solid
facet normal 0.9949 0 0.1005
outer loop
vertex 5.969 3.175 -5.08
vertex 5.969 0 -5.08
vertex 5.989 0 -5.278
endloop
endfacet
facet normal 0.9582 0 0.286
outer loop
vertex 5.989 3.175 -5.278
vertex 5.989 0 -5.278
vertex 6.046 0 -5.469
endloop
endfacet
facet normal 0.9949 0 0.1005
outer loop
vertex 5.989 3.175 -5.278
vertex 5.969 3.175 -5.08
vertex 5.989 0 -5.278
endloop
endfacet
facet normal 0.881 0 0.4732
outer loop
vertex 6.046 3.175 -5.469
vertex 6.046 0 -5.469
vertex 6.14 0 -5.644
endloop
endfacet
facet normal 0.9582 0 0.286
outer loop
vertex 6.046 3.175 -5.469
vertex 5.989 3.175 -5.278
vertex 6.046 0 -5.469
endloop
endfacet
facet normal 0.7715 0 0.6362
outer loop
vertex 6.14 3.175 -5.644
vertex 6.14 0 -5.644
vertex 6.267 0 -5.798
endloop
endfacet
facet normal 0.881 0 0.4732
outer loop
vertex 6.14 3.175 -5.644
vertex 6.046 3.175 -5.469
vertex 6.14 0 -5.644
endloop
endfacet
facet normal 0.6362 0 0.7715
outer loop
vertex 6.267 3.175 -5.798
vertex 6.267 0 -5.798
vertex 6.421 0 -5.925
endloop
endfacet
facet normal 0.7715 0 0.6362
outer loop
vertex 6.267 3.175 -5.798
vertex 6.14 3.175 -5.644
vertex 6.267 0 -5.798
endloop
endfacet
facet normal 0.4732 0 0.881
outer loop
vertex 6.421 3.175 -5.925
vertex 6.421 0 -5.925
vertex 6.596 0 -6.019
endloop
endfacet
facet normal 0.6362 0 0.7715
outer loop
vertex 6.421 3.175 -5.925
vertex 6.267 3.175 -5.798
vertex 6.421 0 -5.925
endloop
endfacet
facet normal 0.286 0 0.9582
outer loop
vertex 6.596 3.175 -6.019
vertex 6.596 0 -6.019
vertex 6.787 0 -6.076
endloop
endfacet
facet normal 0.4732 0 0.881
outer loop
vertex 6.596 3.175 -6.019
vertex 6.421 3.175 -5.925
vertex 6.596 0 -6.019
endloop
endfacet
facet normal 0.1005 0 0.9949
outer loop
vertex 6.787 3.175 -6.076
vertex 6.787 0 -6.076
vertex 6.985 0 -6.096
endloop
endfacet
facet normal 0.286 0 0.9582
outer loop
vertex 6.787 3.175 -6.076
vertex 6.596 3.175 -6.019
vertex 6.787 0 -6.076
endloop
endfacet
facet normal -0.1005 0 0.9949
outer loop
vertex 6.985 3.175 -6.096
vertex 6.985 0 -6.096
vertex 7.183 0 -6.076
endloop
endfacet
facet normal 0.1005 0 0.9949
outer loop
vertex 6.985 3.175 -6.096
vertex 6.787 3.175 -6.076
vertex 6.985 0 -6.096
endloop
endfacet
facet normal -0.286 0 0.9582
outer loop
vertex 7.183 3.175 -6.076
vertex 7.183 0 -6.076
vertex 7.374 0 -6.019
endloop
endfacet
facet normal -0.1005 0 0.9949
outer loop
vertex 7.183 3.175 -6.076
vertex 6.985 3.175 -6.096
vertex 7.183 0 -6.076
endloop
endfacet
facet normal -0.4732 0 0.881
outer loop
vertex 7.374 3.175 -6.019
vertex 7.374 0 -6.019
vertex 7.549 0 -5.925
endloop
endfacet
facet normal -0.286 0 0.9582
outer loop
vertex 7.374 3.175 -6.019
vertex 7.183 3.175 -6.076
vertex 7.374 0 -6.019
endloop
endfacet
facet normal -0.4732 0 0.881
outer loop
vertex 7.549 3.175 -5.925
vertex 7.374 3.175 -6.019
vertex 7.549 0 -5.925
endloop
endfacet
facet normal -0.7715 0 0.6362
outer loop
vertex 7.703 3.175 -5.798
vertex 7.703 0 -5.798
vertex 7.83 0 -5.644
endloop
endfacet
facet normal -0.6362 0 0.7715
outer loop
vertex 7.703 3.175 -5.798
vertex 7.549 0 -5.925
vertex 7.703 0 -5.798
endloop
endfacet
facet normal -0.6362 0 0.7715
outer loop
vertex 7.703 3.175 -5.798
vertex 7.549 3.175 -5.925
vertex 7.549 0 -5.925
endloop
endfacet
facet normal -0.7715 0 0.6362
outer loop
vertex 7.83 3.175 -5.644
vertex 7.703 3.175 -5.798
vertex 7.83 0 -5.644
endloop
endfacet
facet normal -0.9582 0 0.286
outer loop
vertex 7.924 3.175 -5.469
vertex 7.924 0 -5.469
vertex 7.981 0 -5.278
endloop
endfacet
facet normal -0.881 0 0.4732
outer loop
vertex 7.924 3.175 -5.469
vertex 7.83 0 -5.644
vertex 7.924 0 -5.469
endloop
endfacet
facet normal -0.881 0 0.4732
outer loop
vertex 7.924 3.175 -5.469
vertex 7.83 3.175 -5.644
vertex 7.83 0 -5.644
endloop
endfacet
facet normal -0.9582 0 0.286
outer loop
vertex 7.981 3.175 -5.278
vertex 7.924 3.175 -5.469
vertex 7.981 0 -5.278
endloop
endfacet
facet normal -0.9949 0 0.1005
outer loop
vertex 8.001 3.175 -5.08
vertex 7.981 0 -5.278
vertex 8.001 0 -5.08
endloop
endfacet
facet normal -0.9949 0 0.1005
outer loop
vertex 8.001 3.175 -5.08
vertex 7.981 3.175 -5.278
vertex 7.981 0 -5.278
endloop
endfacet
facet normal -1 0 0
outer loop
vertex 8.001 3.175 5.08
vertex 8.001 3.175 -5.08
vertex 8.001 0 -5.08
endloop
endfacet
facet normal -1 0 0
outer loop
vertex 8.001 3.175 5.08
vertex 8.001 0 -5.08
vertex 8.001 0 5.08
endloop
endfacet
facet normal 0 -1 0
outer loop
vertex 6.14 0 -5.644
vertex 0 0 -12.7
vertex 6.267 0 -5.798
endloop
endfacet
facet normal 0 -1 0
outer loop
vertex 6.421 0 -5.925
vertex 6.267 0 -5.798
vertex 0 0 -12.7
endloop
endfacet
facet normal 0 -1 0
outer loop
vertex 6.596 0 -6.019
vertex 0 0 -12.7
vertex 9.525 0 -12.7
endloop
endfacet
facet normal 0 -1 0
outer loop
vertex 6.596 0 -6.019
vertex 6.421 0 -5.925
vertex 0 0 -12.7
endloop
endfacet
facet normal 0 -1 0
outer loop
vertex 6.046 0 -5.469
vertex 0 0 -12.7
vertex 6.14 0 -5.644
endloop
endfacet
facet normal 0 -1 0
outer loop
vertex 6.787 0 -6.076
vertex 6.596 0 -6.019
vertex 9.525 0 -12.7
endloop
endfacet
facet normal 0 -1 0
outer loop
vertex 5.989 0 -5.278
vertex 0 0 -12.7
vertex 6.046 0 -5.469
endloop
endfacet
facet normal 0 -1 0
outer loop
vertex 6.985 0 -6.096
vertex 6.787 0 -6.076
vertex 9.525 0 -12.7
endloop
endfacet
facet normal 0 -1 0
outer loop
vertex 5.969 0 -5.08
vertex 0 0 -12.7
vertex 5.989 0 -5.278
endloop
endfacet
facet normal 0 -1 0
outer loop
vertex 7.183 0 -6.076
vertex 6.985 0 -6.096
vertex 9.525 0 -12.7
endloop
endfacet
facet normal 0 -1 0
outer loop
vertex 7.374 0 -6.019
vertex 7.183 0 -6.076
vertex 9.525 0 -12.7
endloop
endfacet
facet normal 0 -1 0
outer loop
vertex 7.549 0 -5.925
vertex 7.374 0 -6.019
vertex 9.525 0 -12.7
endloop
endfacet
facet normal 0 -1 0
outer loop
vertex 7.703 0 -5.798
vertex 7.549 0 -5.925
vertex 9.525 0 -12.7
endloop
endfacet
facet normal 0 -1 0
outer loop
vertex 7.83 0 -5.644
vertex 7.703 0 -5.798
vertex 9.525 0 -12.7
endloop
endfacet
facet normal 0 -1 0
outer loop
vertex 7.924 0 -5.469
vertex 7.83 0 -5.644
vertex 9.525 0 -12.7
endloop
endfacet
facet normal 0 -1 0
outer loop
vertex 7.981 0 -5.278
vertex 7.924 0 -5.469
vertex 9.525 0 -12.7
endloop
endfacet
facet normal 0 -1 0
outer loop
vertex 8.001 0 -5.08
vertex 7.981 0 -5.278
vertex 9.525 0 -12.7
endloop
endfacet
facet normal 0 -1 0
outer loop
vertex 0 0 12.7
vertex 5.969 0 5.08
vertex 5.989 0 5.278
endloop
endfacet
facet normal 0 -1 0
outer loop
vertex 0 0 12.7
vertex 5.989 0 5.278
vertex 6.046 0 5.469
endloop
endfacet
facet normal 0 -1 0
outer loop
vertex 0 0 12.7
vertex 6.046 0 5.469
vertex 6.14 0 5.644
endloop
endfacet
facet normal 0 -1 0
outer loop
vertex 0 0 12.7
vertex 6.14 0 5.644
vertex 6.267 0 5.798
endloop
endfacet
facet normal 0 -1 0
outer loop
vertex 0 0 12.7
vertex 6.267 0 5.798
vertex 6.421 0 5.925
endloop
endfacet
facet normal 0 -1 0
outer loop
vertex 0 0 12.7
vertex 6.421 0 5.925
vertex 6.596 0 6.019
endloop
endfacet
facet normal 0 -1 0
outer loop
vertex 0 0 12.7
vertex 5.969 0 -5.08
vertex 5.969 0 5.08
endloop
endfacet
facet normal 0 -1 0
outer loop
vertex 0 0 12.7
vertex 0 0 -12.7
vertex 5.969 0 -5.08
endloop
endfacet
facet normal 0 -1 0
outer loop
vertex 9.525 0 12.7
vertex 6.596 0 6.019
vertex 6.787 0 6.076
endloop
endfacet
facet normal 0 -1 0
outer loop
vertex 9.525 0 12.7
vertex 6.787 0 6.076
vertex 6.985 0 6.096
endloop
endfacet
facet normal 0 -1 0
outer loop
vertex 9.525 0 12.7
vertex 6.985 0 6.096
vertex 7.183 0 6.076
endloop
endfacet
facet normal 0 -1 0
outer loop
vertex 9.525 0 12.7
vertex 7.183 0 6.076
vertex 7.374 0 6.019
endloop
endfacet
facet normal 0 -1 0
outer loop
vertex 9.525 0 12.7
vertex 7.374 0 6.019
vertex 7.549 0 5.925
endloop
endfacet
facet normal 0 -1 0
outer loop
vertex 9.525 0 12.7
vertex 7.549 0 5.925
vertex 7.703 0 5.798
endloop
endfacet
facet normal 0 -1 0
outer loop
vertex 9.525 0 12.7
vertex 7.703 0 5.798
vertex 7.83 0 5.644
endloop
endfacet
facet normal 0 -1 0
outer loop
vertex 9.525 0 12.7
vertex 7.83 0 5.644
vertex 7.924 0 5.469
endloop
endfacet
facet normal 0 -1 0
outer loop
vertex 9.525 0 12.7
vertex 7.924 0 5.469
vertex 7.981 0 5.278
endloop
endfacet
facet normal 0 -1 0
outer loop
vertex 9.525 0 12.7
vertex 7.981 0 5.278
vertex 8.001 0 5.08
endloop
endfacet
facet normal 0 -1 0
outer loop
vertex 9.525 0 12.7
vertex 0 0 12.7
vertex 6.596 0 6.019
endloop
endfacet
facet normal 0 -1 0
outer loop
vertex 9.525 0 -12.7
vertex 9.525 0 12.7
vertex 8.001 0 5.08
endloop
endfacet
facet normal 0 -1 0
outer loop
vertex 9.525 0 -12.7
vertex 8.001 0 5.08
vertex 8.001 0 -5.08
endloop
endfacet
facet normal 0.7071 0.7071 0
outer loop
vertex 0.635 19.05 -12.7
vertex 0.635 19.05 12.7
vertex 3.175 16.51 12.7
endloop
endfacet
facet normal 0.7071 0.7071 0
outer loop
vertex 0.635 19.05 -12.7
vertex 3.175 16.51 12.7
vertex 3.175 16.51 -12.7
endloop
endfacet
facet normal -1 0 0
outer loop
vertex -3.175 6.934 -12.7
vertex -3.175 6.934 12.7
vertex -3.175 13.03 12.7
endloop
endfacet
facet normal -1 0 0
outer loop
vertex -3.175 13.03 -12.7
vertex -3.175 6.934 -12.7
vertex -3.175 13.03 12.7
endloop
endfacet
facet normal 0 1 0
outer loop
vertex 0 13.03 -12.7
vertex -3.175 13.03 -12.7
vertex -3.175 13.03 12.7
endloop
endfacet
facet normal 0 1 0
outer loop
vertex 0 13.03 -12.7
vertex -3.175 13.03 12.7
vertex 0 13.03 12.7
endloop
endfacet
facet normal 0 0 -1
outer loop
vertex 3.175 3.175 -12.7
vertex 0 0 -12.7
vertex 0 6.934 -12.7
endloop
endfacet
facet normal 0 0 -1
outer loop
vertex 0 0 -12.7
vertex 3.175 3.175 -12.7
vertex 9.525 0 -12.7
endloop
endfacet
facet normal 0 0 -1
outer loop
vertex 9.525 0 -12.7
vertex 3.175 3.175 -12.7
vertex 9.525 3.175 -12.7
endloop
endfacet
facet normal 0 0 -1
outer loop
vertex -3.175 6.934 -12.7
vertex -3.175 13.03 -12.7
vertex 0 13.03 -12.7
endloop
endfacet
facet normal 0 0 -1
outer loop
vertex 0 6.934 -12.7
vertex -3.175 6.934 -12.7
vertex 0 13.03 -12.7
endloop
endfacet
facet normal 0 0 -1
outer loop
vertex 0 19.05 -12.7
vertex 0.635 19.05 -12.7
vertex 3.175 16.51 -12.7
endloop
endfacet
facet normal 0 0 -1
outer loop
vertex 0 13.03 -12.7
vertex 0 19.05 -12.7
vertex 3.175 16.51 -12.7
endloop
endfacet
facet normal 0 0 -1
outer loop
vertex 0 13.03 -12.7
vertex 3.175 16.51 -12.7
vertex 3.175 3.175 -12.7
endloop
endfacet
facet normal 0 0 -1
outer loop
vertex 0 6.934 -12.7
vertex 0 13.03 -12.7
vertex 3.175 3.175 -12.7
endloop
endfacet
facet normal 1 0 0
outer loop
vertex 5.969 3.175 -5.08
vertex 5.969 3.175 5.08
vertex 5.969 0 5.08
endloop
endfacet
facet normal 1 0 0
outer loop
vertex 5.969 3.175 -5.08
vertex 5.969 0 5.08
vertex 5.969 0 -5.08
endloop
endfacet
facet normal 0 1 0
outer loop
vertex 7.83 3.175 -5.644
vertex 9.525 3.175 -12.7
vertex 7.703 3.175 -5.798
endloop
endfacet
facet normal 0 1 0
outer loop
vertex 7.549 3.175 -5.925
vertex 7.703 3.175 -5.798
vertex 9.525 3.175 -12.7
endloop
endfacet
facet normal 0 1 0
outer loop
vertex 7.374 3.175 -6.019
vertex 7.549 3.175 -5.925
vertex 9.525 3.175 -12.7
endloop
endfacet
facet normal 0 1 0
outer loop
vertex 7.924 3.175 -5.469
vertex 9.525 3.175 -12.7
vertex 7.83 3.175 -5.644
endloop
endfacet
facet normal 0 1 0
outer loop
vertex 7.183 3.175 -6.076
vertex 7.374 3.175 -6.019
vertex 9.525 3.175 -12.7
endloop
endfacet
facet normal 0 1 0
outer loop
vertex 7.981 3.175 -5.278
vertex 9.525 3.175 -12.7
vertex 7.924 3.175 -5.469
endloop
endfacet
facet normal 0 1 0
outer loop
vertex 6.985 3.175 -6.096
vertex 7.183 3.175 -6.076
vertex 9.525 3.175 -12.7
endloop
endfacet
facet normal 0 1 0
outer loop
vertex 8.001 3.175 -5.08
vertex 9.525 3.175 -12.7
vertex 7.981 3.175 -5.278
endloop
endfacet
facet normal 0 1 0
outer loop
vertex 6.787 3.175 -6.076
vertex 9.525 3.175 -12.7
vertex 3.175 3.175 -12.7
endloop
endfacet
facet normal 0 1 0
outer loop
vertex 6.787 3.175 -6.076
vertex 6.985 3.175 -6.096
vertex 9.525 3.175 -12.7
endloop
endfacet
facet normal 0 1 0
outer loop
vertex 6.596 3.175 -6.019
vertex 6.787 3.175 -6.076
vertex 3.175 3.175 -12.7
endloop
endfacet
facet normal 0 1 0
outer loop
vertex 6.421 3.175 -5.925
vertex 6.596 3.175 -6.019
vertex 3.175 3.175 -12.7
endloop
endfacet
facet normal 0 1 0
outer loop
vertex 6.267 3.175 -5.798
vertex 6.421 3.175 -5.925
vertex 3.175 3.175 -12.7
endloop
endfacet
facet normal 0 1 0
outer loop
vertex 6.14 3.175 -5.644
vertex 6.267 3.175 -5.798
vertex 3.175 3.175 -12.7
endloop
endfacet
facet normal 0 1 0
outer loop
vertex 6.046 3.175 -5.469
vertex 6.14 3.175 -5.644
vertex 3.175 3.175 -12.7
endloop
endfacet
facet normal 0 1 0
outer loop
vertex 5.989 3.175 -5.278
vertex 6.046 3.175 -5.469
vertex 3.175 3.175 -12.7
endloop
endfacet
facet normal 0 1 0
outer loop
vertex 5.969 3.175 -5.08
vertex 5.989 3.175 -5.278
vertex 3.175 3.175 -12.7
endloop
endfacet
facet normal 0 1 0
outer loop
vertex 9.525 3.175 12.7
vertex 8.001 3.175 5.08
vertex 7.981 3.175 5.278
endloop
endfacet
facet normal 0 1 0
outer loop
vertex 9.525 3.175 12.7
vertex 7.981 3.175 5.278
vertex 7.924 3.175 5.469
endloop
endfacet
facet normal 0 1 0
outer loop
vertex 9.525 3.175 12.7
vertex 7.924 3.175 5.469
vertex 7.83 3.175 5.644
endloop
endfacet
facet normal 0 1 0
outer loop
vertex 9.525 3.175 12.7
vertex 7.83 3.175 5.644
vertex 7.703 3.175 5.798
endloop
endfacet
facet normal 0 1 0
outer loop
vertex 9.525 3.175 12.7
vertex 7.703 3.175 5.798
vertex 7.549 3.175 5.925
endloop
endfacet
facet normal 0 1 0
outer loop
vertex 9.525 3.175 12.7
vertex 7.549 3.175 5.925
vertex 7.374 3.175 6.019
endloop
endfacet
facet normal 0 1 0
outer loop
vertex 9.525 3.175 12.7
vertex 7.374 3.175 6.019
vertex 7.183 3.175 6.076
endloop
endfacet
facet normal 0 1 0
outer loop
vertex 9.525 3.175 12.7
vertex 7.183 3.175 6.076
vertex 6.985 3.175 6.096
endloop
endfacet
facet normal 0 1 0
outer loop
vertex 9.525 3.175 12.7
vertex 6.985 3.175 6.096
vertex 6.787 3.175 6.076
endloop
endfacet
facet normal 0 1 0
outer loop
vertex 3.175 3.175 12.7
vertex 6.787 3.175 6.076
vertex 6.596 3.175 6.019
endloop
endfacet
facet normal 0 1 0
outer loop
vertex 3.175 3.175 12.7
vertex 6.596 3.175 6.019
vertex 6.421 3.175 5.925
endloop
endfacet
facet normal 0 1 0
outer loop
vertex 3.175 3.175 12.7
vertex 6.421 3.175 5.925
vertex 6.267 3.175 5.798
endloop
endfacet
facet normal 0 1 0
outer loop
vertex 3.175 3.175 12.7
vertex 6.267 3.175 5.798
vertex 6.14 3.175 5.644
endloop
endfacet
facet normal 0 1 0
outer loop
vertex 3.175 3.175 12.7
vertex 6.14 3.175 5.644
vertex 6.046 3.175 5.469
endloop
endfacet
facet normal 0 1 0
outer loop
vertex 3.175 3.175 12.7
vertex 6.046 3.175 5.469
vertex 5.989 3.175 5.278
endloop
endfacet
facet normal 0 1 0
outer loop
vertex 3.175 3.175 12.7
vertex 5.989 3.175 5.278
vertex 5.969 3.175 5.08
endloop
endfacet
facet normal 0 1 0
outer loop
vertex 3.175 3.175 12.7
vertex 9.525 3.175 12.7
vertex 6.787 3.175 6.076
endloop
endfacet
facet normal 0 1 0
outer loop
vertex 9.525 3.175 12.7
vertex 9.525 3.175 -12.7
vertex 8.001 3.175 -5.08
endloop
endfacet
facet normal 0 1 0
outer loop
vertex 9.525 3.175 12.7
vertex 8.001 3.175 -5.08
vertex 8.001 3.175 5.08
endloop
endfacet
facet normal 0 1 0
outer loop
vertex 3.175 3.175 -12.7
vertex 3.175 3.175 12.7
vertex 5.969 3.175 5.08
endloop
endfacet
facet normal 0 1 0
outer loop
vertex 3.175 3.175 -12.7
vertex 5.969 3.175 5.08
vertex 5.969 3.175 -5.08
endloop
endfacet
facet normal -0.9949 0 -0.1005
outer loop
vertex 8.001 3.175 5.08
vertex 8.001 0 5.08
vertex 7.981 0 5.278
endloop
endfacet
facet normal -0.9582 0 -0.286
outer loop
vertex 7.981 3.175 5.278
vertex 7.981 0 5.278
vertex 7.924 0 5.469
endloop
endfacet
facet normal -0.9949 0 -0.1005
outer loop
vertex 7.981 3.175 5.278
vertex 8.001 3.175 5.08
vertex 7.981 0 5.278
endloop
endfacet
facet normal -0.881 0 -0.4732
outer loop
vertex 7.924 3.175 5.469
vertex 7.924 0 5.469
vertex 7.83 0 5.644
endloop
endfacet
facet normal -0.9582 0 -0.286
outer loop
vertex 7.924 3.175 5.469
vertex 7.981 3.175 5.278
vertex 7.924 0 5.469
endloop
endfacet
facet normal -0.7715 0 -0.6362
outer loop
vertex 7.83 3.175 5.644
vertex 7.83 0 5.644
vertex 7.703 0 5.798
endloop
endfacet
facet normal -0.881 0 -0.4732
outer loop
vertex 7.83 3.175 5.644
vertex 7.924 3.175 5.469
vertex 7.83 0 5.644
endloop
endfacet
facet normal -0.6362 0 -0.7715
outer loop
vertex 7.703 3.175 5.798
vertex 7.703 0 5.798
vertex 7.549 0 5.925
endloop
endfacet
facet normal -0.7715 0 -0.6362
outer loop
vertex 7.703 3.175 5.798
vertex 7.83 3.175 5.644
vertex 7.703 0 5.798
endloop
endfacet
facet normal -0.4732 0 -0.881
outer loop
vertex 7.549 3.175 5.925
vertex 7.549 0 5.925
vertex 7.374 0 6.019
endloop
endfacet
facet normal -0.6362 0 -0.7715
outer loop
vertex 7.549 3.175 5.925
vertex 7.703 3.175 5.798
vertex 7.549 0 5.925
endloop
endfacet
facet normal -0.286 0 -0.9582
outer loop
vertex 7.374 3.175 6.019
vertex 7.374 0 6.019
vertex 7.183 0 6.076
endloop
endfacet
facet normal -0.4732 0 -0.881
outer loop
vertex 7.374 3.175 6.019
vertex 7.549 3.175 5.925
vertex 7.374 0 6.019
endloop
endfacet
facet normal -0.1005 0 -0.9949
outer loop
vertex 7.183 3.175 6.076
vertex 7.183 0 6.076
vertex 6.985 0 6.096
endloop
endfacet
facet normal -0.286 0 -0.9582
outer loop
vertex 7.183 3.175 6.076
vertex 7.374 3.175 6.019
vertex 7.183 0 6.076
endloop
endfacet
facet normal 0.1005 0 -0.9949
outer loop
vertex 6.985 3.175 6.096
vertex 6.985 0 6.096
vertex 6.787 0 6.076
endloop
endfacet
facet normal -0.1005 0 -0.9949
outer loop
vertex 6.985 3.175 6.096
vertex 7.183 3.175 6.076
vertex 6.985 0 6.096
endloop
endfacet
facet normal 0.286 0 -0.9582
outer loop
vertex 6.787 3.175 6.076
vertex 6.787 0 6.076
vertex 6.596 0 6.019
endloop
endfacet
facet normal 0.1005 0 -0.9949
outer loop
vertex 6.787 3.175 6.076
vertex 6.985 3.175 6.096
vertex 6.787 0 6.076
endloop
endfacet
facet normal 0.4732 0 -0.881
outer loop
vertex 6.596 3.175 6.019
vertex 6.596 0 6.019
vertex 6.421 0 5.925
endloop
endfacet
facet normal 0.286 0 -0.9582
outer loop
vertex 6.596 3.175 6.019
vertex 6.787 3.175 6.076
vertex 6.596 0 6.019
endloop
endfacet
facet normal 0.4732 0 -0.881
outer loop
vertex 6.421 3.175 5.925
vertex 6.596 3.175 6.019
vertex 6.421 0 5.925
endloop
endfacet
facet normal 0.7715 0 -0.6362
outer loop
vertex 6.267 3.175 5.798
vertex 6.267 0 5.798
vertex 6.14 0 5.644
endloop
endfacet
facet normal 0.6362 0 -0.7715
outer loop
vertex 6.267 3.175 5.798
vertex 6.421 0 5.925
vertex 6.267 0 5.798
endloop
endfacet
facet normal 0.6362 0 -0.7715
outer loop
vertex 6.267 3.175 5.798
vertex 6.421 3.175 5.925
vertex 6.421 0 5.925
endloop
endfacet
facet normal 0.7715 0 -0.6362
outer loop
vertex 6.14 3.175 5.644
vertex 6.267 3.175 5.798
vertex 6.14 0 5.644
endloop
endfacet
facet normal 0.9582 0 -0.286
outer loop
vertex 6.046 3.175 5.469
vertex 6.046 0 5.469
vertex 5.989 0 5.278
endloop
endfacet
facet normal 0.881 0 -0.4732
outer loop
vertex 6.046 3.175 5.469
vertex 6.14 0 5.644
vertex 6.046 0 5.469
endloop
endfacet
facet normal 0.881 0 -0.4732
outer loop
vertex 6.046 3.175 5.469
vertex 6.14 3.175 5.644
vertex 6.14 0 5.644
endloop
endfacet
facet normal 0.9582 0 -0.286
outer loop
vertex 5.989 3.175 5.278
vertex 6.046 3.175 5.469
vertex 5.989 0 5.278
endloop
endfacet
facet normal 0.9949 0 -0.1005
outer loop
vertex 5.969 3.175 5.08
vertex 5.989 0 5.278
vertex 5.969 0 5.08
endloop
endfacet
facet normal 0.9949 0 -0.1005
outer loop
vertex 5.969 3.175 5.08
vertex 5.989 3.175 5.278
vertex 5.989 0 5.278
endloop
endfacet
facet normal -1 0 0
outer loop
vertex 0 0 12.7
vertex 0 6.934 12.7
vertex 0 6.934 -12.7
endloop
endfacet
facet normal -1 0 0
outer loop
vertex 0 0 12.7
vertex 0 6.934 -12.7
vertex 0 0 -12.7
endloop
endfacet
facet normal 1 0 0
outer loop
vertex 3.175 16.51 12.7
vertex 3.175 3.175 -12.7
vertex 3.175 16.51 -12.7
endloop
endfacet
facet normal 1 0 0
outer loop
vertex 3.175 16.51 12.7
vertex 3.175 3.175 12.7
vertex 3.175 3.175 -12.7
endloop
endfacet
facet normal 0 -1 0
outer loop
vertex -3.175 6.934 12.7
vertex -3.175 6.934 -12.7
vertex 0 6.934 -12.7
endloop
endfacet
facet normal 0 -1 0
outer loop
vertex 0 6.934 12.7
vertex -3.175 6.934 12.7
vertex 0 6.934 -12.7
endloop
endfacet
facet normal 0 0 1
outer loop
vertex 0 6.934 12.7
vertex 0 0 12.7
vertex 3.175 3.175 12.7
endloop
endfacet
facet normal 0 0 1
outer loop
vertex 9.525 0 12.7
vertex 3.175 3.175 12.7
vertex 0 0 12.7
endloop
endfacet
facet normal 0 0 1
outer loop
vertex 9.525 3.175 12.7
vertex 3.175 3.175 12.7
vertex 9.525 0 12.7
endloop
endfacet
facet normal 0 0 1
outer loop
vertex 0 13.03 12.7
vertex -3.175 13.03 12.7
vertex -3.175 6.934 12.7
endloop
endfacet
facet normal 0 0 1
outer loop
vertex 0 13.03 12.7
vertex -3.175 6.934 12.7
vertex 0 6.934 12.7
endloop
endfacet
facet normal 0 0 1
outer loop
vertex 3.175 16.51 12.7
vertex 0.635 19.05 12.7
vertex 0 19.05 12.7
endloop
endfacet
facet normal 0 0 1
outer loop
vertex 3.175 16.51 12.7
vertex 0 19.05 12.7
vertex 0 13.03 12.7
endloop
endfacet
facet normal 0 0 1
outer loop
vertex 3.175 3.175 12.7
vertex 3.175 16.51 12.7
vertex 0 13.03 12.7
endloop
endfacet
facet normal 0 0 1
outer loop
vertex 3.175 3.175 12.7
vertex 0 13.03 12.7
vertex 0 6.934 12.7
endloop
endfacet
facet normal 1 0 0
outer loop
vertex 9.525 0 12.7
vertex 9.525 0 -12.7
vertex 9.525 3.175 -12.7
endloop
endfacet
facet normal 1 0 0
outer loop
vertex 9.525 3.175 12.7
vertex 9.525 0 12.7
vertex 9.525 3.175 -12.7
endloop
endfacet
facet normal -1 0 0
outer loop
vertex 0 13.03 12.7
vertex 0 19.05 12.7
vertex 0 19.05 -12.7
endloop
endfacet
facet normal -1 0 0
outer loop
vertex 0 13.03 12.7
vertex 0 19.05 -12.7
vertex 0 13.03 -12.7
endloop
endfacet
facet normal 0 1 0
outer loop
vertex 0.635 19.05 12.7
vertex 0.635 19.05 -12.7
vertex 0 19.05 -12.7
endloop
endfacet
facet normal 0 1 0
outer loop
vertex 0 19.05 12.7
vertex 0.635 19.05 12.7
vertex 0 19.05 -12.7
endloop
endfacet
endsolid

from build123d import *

# Parameters (mm, degrees)
BOSS_EXTRUDE1_DEPTH = 12.7
SKETCH2_W           = 3.175
SKETCH2_H           = 6.096
BOSS_EXTRUDE2_DEPTH = 12.7
CUT_EXTRUDE1_DEPTH  = 4.175
CHAMFER1_SIZE       = 2.54


with BuildPart() as part:
    # Sketch1 → Boss-Extrude1 (new body, symmetric)
    with BuildSketch(Plane.XY):
        Polygon((0, 0), (9.525, 0), (9.525, 3.175), (3.175, 3.175), (3.175, 19.05), (0, 19.05), align=None)
    extrude(amount=BOSS_EXTRUDE1_DEPTH, both=True)

    # Sketch2 → Boss-Extrude2 (add, symmetric)
    with BuildSketch(Plane.XY):
        with Locations((-1.5875, 9.9822)):
            Rectangle(SKETCH2_W, SKETCH2_H)
    extrude(amount=BOSS_EXTRUDE2_DEPTH, both=True)

    # Sketch3 → Cut-Extrude1 (cut, through all)
    with BuildSketch(Plane(origin=(0, 3.175, 0), x_dir=(1, 0, 0), z_dir=(0, 1, 0))):
        with BuildLine():
            Line((8.001, 5.08), (8.001, -5.08))
            ThreePointArc((8.001, -5.08), (6.985, -6.096), (5.969, -5.08))
            Line((5.969, -5.08), (5.969, 5.08))
            ThreePointArc((5.969, 5.08), (6.985, 6.096), (8.001, 5.08))
        make_face()
    extrude(amount=-CUT_EXTRUDE1_DEPTH, mode=Mode.SUBTRACT)

    # Chamfer1
    chamfer1_edges = [part.edges().sort_by_distance(p)[0] for p in [
        (3.175, 19.05, 0),
    ]]
    chamfer(chamfer1_edges, length=CHAMFER1_SIZE)


solid = part.part
